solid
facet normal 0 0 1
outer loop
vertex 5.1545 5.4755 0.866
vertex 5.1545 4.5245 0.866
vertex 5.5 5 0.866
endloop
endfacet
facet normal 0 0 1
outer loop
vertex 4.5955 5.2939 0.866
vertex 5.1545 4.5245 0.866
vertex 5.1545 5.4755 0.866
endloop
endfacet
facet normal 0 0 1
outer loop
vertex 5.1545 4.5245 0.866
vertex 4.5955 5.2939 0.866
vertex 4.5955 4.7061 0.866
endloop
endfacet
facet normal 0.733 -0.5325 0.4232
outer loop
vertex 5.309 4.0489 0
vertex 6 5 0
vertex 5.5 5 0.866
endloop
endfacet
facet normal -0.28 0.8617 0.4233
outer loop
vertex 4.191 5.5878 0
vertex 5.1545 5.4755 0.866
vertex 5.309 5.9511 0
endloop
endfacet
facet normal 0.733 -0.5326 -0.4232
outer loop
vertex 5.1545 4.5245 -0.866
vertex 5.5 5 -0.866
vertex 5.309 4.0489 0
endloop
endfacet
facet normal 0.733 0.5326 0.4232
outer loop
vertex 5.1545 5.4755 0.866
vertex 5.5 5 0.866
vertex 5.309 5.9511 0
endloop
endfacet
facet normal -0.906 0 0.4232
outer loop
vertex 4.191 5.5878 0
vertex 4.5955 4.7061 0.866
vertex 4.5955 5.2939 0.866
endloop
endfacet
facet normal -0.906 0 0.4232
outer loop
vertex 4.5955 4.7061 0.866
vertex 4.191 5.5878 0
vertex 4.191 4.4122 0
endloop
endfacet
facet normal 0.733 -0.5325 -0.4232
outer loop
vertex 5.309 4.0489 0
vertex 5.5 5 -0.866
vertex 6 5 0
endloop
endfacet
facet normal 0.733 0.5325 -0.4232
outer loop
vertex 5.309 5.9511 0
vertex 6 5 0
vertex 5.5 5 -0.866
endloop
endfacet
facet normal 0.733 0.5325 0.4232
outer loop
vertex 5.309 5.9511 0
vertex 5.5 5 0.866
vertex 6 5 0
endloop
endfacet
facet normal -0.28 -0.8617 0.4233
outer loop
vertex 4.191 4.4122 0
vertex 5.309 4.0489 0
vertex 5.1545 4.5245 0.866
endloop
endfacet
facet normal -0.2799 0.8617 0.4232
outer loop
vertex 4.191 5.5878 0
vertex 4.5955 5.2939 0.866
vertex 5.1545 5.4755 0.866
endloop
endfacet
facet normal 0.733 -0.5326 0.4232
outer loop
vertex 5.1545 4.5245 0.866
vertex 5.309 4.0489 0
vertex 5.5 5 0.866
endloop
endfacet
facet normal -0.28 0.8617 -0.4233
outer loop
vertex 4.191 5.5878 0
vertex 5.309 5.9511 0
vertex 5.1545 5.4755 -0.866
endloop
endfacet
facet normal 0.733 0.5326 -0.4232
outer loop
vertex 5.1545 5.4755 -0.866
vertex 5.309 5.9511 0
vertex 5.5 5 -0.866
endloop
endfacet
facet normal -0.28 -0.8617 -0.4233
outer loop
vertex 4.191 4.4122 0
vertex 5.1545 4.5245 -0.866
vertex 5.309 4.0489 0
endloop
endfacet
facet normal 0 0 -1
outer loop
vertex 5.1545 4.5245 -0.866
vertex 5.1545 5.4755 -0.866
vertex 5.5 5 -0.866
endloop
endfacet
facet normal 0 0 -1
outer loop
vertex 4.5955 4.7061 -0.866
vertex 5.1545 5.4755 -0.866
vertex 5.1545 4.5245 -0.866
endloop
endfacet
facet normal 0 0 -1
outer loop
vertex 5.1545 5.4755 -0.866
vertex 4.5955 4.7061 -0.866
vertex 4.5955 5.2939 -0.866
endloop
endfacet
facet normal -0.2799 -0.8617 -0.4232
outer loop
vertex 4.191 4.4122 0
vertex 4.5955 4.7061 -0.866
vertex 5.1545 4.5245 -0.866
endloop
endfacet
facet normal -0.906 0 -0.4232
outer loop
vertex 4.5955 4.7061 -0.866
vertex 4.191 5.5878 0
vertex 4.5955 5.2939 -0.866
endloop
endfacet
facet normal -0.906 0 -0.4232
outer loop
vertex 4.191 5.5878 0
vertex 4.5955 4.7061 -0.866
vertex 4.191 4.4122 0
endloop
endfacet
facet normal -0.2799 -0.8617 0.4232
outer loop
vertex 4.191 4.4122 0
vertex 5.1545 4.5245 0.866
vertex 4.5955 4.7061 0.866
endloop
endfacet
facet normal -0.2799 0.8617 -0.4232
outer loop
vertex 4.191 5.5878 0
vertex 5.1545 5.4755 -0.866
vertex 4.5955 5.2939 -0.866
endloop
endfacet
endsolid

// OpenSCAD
function cat(L1, L2) = [for (i=[0:len(L1)+len(L2)-1])
                        i < len(L1)? L1[i] : L2[i-len(L1)]] ;


module dish(type = "sphere", sides = 10, length = 10){

  //TODO length scaling

  function pointyDish(x,y) = (x == 0 || y == 0 || x== sides || y == sides ) ? 0 : abs(5-x) + abs(5-y);

  /*
  matrix looks like this:
  [
  [0, 0, 0], [0, 1, 0], [0, 2, 0],
  [1, 0, 0], [1, 1, 0], [1, 2, 0],
  [2, 0, 0], [2, 1, 0], [2, 2, 0]
  ]
  */
  // row is how many verts are actually in a row
  row = sides + 1;

  // first make an x-first matrix of points. (0,0), (1,0) etc
  matrix = cat([
    for ( y = [0 : sides], x = [ 0 : sides ]) [x, y, pointyDish(x,y)]
  ], [[sides / 2, sides / 2, 0]]);

  echo(matrix);

  echo(matrix[121]);

  echo(len(matrix));

  translate([sides / 2, sides / 2, 0]) sphere(r=1);

  // then make 2 faces for each set of four points: (0,1,4), (0,4,3)
  // sides - 1 because we are doing this fromt the bottom left corner and extending up and out 1 vertex
  // so the rightmost and topmost vertexes are already covered
  f1 = [
    for (y = [0 : sides-1], x = [ 0 : sides-1 ], num = [0, 1]) (
      num == 0 ?
        [(x + row * y), (x + row * y + 1), (x + row * y + 1 + row)] :
        [(x + row * y), (x + row * y + 1 + row), (x + row * y + row)])
  ];

  f2 = cat(f1, [for (n = [0: sides-1]) [n, n+1, len(matrix) - 1]]);

  faces = cat(f2, [for (n = [len(matrix) - sides-1 : len(matrix)]) [n-1, n, len(matrix) - 1]]);
  // add

  /*
  faces needs to start like this:
  [
    [0,1,4,3],
    [1,2,5,4]
  ]*/

  /*index, index + 1, index + 1 + row, index + row*/

  polyhedron(points = matrix, faces=faces);

}

dish();
